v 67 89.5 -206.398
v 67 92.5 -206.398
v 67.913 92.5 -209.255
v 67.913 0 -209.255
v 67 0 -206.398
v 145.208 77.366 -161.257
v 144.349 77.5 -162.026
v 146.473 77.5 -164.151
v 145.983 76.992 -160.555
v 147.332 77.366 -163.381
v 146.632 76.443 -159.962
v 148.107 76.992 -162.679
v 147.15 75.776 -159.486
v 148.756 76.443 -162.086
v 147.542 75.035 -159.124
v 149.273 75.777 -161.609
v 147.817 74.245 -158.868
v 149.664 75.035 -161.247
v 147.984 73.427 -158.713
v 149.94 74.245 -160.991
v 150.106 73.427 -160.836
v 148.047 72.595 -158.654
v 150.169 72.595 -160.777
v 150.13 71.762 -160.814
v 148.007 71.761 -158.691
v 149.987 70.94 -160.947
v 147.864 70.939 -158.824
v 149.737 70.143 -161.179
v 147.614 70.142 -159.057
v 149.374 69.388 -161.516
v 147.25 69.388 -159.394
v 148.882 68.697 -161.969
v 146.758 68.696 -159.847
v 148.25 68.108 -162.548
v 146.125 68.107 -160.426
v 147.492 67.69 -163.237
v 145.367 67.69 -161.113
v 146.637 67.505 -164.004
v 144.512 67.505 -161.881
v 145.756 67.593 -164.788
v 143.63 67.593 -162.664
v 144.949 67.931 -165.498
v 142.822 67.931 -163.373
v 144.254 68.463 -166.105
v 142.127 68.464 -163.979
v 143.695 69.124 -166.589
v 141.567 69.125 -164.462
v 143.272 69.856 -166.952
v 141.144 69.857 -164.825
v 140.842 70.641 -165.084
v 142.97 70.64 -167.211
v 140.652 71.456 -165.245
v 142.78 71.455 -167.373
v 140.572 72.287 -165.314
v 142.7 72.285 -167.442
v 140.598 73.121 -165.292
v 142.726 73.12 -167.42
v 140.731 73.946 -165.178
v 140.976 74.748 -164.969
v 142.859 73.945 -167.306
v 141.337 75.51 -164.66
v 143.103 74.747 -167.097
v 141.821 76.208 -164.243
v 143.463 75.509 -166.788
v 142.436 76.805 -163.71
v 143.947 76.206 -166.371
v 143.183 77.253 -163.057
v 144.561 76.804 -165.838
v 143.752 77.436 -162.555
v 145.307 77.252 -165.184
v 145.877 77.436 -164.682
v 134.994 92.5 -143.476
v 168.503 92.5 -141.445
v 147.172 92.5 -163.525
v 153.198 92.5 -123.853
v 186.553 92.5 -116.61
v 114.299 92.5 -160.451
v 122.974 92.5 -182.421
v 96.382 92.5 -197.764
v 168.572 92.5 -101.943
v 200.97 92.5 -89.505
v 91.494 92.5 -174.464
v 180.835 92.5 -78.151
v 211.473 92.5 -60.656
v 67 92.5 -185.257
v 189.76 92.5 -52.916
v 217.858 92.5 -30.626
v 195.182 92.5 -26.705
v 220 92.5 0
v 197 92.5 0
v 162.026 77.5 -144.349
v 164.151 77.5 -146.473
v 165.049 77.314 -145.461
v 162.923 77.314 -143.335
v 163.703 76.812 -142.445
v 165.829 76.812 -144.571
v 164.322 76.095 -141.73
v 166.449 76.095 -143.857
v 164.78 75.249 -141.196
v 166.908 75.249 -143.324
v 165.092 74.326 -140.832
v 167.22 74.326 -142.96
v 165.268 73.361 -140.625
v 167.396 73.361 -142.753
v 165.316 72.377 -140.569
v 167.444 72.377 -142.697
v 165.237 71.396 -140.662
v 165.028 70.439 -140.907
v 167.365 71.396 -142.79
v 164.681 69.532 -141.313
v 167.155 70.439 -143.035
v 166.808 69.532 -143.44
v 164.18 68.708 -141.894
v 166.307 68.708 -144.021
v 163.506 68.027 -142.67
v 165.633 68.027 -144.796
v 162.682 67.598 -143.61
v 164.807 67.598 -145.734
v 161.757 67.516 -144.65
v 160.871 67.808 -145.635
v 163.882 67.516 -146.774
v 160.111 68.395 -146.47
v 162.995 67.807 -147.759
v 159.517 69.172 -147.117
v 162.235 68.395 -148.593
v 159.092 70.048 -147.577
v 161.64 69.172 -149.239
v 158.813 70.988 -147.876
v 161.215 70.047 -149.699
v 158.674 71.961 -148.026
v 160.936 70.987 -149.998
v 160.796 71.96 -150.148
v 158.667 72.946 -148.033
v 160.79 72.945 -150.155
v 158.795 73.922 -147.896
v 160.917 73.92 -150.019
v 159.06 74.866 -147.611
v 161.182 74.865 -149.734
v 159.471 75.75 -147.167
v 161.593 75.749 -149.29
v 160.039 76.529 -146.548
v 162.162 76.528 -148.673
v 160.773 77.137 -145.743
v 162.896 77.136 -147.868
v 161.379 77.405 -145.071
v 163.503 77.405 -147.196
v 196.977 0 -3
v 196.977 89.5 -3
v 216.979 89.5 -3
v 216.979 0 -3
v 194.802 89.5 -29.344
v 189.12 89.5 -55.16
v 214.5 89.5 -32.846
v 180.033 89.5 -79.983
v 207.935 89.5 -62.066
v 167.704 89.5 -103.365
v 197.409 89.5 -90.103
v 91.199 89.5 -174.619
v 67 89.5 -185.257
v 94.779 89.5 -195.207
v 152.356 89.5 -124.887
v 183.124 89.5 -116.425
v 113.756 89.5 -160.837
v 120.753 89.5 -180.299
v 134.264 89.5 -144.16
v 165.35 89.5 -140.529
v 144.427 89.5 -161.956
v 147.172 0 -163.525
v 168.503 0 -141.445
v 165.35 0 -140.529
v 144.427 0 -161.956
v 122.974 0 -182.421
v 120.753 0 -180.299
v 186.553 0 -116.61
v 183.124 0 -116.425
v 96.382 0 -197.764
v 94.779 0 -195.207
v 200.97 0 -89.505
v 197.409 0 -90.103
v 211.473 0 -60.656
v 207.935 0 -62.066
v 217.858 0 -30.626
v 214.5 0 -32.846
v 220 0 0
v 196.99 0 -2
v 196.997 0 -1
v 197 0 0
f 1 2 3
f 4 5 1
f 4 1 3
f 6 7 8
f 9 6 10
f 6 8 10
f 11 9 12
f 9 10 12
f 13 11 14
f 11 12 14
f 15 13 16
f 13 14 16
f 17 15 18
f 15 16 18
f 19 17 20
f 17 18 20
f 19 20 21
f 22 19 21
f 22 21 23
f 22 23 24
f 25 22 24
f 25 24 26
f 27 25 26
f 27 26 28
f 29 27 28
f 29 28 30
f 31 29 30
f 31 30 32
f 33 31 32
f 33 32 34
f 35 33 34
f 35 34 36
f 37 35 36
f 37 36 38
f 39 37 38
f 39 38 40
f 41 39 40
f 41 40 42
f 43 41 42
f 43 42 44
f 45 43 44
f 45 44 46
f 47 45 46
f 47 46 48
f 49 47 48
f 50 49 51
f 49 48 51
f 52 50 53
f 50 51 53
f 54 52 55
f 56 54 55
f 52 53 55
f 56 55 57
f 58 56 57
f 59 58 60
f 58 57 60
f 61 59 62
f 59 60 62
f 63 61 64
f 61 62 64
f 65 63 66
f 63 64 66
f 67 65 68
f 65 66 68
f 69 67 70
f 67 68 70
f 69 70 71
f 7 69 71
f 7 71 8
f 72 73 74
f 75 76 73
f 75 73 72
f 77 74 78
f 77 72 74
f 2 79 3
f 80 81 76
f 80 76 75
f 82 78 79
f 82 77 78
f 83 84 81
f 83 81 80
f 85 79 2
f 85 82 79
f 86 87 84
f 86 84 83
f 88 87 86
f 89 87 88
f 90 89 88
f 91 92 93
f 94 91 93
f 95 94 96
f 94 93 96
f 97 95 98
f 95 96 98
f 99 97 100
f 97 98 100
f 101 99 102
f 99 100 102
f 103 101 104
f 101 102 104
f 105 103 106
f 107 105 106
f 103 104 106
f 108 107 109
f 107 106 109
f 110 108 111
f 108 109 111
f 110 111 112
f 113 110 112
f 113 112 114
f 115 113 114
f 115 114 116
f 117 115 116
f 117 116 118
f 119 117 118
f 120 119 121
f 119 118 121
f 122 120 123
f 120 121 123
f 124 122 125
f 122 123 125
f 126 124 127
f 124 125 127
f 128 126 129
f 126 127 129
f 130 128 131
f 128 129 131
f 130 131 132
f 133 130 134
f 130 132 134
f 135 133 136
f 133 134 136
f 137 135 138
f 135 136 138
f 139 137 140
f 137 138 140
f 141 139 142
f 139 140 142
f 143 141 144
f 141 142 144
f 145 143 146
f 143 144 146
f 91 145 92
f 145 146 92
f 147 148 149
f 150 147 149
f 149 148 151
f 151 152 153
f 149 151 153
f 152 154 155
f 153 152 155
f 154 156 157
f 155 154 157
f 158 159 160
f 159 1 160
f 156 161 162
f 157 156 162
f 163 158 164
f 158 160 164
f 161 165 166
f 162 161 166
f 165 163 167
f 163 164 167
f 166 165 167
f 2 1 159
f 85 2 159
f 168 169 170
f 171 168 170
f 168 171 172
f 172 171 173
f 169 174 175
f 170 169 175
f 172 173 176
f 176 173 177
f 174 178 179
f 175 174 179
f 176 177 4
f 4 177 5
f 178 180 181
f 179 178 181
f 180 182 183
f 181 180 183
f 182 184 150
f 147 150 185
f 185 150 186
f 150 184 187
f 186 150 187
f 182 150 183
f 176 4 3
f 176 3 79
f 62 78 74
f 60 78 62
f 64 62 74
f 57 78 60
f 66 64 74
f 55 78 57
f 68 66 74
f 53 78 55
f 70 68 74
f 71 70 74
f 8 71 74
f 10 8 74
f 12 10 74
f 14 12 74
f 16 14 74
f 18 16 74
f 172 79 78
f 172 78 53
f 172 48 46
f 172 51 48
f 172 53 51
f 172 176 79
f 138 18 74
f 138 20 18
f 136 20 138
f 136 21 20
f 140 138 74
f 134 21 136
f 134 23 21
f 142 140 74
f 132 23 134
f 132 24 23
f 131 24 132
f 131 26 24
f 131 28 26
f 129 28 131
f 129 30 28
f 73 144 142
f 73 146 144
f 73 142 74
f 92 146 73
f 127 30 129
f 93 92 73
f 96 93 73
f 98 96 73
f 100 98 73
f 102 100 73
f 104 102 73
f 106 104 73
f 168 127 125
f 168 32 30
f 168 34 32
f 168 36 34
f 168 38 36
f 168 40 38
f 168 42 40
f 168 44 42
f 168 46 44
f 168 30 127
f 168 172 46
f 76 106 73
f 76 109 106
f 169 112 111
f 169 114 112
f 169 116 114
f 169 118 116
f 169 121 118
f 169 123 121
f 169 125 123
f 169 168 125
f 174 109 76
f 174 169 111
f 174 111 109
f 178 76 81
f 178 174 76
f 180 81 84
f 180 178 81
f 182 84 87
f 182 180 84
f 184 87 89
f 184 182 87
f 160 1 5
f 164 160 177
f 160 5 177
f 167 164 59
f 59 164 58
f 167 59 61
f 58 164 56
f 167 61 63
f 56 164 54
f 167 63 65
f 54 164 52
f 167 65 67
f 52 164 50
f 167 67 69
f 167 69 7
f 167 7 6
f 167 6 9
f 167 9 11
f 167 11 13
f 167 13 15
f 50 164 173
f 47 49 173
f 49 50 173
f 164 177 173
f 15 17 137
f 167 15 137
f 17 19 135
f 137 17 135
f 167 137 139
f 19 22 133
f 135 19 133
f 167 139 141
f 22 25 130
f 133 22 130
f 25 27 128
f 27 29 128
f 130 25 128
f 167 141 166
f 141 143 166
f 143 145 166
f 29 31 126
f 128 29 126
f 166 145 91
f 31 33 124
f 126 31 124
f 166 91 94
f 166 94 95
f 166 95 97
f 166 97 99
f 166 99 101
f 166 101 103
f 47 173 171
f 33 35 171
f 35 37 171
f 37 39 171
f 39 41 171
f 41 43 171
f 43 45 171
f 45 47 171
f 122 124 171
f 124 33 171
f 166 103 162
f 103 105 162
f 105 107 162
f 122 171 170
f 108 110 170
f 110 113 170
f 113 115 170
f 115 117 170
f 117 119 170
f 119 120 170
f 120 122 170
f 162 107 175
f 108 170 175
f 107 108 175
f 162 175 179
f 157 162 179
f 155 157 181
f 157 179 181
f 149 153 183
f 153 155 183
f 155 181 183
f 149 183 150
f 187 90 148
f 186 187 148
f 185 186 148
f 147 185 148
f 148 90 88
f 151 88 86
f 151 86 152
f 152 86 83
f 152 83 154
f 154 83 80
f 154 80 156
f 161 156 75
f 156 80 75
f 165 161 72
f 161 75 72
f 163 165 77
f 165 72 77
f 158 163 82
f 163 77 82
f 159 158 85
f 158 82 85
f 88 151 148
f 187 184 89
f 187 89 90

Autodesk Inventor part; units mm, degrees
ref_plane "YZ Plane" through (0, 0, 0) normal (1, 0, 0) x (0, 1, 0)
ref_plane "XZ Plane" through (0, 0, 0) normal (0, 1, 0) x (-1, 0, 0)
sketch "Sketch1" plane through (0, 0, 0) normal (0, 1, 0) x (-1, 0, 0)
  arc A0 (-220, 0) -> (-67, -209.5495) centre (0, 0) ccw
  arc A1 (-217, 0) -> (-67, -206.3977) centre (0, 0) ccw
  line L0 (-220, 0) -> (-217, 0)
  line L1 (0, -220) -> (0, -217)
  line L2 (0, -220) -> (-67, -220)
  line L3 (0, -220) -> (67, -220) construction
  line L4 (-67, -220) -> (-67, -206.3977)
  line L5 (-67, -206.3977) -> (-65.0308, -207.0265)
  line L6 (-67, -206.3977) -> (-68.4601, -210.9695)
  point P0 (-67.9127, -209.2555)
  dimension "d0" = 440
  dimension "d1" = 3
  dimension "d2" = 67
  dimension "d3" = 180
  dimension "d9" = 90
extrude "Extrusion1" add sketch "Sketch1" along normal blind 92.5 contours L0 A1 L6 A0
sketch "Sketch3" plane through (0, 92.5, 0) normal (0, 1, 0) x (1, 0, 0)
  arc A0 (217, 0) -> (67, 206.3977) centre (0, 0) ccw projected
  arc A1 (197, 0) -> (60.8249, 187.3748) centre (0, 0) ccw
  line L0 (60.8249, 187.3748) -> (67, 206.3977)
  line L1 (197, 0) -> (217, 0)
  dimension "d10" = 20
extrude "Extrusion3" add sketch "Sketch3" against normal blind 3
sketch "Sketch4" plane through (0, 92.5, 0) normal (0, 1, 0) x (1, 0, 0)
  line L0 (197, 0) -> (220, 0) projected
  arc A0 (197, 0) -> (60.8249, 187.3748) centre (0, 0) ccw projected
  arc A1 (220, 0) -> (67.9127, 209.2555) centre (0, 0) ccw projected
  line L1 (196.9772, 3) -> (219.9795, 3)
  dimension "d13" = 3
extrude "Extrusion4" add sketch "Sketch4" against normal up to surface (92.5 mm away)
sketch "Sketch5" plane through (0, 89.5, 0) normal (0, -1, 0) x (1, 0, 0)
  arc A0 (60.8249, -187.3748) -> (196.9772, -3) centre (0, 0) ccw projected
  line L0 (60.8249, -187.3748) -> (67, -206.3977) projected
  arc A1 (67, -206.3977) -> (216.9793, -3) centre (0, 0) ccw projected
  line L1 (67, -206.3977) -> (67, -185.2566)
  line L2 (67, -206.3977) -> (88.1411, -206.3977) construction
  dimension "d16" = 90
extrude "Extrusion5" cut sketch "Sketch5" against normal through all
sketch "Sketch6" plane through (0, 0, 0) normal (0, -1, 0) x (1, 0, 0)
  line L0 (0, 0) -> (155.5635, -155.5635)
  arc A0 (67.9127, -209.2555) -> (220, 0) centre (0, 0) ccw projected
  line L1 (0, 0) -> (220, 0) construction
  dimension "d19" = 45
ref_plane "Work Plane1" through (155.5635, 0, -155.5635) normal (0.7071, 0, -0.7071) x (0, 1, 0)
sketch "Sketch7" plane through (155.5635, 0, -155.5635) normal (0.7071, 0, -0.7071) x (0, 1, 0)
  circle A0 centre (72.5, -12.5) radius 5
  circle A1 centre (72.5, 12.5) radius 5
  line L0 (92.5, -99.9445) -> (92.5, 155.5635) projected
  line L1 (0, 0) -> (103.0589, 0)
  dimension "d20" = 10
  dimension "d21" = 10
  dimension "d22" = 25
  dimension "d23" = 20
  dimension "d24" = 20
  dimension "d25" = 12.5
extrude "Extrusion6" cut sketch "Sketch7" against normal through all
properties part number "Bottom_Enclosure_2"
